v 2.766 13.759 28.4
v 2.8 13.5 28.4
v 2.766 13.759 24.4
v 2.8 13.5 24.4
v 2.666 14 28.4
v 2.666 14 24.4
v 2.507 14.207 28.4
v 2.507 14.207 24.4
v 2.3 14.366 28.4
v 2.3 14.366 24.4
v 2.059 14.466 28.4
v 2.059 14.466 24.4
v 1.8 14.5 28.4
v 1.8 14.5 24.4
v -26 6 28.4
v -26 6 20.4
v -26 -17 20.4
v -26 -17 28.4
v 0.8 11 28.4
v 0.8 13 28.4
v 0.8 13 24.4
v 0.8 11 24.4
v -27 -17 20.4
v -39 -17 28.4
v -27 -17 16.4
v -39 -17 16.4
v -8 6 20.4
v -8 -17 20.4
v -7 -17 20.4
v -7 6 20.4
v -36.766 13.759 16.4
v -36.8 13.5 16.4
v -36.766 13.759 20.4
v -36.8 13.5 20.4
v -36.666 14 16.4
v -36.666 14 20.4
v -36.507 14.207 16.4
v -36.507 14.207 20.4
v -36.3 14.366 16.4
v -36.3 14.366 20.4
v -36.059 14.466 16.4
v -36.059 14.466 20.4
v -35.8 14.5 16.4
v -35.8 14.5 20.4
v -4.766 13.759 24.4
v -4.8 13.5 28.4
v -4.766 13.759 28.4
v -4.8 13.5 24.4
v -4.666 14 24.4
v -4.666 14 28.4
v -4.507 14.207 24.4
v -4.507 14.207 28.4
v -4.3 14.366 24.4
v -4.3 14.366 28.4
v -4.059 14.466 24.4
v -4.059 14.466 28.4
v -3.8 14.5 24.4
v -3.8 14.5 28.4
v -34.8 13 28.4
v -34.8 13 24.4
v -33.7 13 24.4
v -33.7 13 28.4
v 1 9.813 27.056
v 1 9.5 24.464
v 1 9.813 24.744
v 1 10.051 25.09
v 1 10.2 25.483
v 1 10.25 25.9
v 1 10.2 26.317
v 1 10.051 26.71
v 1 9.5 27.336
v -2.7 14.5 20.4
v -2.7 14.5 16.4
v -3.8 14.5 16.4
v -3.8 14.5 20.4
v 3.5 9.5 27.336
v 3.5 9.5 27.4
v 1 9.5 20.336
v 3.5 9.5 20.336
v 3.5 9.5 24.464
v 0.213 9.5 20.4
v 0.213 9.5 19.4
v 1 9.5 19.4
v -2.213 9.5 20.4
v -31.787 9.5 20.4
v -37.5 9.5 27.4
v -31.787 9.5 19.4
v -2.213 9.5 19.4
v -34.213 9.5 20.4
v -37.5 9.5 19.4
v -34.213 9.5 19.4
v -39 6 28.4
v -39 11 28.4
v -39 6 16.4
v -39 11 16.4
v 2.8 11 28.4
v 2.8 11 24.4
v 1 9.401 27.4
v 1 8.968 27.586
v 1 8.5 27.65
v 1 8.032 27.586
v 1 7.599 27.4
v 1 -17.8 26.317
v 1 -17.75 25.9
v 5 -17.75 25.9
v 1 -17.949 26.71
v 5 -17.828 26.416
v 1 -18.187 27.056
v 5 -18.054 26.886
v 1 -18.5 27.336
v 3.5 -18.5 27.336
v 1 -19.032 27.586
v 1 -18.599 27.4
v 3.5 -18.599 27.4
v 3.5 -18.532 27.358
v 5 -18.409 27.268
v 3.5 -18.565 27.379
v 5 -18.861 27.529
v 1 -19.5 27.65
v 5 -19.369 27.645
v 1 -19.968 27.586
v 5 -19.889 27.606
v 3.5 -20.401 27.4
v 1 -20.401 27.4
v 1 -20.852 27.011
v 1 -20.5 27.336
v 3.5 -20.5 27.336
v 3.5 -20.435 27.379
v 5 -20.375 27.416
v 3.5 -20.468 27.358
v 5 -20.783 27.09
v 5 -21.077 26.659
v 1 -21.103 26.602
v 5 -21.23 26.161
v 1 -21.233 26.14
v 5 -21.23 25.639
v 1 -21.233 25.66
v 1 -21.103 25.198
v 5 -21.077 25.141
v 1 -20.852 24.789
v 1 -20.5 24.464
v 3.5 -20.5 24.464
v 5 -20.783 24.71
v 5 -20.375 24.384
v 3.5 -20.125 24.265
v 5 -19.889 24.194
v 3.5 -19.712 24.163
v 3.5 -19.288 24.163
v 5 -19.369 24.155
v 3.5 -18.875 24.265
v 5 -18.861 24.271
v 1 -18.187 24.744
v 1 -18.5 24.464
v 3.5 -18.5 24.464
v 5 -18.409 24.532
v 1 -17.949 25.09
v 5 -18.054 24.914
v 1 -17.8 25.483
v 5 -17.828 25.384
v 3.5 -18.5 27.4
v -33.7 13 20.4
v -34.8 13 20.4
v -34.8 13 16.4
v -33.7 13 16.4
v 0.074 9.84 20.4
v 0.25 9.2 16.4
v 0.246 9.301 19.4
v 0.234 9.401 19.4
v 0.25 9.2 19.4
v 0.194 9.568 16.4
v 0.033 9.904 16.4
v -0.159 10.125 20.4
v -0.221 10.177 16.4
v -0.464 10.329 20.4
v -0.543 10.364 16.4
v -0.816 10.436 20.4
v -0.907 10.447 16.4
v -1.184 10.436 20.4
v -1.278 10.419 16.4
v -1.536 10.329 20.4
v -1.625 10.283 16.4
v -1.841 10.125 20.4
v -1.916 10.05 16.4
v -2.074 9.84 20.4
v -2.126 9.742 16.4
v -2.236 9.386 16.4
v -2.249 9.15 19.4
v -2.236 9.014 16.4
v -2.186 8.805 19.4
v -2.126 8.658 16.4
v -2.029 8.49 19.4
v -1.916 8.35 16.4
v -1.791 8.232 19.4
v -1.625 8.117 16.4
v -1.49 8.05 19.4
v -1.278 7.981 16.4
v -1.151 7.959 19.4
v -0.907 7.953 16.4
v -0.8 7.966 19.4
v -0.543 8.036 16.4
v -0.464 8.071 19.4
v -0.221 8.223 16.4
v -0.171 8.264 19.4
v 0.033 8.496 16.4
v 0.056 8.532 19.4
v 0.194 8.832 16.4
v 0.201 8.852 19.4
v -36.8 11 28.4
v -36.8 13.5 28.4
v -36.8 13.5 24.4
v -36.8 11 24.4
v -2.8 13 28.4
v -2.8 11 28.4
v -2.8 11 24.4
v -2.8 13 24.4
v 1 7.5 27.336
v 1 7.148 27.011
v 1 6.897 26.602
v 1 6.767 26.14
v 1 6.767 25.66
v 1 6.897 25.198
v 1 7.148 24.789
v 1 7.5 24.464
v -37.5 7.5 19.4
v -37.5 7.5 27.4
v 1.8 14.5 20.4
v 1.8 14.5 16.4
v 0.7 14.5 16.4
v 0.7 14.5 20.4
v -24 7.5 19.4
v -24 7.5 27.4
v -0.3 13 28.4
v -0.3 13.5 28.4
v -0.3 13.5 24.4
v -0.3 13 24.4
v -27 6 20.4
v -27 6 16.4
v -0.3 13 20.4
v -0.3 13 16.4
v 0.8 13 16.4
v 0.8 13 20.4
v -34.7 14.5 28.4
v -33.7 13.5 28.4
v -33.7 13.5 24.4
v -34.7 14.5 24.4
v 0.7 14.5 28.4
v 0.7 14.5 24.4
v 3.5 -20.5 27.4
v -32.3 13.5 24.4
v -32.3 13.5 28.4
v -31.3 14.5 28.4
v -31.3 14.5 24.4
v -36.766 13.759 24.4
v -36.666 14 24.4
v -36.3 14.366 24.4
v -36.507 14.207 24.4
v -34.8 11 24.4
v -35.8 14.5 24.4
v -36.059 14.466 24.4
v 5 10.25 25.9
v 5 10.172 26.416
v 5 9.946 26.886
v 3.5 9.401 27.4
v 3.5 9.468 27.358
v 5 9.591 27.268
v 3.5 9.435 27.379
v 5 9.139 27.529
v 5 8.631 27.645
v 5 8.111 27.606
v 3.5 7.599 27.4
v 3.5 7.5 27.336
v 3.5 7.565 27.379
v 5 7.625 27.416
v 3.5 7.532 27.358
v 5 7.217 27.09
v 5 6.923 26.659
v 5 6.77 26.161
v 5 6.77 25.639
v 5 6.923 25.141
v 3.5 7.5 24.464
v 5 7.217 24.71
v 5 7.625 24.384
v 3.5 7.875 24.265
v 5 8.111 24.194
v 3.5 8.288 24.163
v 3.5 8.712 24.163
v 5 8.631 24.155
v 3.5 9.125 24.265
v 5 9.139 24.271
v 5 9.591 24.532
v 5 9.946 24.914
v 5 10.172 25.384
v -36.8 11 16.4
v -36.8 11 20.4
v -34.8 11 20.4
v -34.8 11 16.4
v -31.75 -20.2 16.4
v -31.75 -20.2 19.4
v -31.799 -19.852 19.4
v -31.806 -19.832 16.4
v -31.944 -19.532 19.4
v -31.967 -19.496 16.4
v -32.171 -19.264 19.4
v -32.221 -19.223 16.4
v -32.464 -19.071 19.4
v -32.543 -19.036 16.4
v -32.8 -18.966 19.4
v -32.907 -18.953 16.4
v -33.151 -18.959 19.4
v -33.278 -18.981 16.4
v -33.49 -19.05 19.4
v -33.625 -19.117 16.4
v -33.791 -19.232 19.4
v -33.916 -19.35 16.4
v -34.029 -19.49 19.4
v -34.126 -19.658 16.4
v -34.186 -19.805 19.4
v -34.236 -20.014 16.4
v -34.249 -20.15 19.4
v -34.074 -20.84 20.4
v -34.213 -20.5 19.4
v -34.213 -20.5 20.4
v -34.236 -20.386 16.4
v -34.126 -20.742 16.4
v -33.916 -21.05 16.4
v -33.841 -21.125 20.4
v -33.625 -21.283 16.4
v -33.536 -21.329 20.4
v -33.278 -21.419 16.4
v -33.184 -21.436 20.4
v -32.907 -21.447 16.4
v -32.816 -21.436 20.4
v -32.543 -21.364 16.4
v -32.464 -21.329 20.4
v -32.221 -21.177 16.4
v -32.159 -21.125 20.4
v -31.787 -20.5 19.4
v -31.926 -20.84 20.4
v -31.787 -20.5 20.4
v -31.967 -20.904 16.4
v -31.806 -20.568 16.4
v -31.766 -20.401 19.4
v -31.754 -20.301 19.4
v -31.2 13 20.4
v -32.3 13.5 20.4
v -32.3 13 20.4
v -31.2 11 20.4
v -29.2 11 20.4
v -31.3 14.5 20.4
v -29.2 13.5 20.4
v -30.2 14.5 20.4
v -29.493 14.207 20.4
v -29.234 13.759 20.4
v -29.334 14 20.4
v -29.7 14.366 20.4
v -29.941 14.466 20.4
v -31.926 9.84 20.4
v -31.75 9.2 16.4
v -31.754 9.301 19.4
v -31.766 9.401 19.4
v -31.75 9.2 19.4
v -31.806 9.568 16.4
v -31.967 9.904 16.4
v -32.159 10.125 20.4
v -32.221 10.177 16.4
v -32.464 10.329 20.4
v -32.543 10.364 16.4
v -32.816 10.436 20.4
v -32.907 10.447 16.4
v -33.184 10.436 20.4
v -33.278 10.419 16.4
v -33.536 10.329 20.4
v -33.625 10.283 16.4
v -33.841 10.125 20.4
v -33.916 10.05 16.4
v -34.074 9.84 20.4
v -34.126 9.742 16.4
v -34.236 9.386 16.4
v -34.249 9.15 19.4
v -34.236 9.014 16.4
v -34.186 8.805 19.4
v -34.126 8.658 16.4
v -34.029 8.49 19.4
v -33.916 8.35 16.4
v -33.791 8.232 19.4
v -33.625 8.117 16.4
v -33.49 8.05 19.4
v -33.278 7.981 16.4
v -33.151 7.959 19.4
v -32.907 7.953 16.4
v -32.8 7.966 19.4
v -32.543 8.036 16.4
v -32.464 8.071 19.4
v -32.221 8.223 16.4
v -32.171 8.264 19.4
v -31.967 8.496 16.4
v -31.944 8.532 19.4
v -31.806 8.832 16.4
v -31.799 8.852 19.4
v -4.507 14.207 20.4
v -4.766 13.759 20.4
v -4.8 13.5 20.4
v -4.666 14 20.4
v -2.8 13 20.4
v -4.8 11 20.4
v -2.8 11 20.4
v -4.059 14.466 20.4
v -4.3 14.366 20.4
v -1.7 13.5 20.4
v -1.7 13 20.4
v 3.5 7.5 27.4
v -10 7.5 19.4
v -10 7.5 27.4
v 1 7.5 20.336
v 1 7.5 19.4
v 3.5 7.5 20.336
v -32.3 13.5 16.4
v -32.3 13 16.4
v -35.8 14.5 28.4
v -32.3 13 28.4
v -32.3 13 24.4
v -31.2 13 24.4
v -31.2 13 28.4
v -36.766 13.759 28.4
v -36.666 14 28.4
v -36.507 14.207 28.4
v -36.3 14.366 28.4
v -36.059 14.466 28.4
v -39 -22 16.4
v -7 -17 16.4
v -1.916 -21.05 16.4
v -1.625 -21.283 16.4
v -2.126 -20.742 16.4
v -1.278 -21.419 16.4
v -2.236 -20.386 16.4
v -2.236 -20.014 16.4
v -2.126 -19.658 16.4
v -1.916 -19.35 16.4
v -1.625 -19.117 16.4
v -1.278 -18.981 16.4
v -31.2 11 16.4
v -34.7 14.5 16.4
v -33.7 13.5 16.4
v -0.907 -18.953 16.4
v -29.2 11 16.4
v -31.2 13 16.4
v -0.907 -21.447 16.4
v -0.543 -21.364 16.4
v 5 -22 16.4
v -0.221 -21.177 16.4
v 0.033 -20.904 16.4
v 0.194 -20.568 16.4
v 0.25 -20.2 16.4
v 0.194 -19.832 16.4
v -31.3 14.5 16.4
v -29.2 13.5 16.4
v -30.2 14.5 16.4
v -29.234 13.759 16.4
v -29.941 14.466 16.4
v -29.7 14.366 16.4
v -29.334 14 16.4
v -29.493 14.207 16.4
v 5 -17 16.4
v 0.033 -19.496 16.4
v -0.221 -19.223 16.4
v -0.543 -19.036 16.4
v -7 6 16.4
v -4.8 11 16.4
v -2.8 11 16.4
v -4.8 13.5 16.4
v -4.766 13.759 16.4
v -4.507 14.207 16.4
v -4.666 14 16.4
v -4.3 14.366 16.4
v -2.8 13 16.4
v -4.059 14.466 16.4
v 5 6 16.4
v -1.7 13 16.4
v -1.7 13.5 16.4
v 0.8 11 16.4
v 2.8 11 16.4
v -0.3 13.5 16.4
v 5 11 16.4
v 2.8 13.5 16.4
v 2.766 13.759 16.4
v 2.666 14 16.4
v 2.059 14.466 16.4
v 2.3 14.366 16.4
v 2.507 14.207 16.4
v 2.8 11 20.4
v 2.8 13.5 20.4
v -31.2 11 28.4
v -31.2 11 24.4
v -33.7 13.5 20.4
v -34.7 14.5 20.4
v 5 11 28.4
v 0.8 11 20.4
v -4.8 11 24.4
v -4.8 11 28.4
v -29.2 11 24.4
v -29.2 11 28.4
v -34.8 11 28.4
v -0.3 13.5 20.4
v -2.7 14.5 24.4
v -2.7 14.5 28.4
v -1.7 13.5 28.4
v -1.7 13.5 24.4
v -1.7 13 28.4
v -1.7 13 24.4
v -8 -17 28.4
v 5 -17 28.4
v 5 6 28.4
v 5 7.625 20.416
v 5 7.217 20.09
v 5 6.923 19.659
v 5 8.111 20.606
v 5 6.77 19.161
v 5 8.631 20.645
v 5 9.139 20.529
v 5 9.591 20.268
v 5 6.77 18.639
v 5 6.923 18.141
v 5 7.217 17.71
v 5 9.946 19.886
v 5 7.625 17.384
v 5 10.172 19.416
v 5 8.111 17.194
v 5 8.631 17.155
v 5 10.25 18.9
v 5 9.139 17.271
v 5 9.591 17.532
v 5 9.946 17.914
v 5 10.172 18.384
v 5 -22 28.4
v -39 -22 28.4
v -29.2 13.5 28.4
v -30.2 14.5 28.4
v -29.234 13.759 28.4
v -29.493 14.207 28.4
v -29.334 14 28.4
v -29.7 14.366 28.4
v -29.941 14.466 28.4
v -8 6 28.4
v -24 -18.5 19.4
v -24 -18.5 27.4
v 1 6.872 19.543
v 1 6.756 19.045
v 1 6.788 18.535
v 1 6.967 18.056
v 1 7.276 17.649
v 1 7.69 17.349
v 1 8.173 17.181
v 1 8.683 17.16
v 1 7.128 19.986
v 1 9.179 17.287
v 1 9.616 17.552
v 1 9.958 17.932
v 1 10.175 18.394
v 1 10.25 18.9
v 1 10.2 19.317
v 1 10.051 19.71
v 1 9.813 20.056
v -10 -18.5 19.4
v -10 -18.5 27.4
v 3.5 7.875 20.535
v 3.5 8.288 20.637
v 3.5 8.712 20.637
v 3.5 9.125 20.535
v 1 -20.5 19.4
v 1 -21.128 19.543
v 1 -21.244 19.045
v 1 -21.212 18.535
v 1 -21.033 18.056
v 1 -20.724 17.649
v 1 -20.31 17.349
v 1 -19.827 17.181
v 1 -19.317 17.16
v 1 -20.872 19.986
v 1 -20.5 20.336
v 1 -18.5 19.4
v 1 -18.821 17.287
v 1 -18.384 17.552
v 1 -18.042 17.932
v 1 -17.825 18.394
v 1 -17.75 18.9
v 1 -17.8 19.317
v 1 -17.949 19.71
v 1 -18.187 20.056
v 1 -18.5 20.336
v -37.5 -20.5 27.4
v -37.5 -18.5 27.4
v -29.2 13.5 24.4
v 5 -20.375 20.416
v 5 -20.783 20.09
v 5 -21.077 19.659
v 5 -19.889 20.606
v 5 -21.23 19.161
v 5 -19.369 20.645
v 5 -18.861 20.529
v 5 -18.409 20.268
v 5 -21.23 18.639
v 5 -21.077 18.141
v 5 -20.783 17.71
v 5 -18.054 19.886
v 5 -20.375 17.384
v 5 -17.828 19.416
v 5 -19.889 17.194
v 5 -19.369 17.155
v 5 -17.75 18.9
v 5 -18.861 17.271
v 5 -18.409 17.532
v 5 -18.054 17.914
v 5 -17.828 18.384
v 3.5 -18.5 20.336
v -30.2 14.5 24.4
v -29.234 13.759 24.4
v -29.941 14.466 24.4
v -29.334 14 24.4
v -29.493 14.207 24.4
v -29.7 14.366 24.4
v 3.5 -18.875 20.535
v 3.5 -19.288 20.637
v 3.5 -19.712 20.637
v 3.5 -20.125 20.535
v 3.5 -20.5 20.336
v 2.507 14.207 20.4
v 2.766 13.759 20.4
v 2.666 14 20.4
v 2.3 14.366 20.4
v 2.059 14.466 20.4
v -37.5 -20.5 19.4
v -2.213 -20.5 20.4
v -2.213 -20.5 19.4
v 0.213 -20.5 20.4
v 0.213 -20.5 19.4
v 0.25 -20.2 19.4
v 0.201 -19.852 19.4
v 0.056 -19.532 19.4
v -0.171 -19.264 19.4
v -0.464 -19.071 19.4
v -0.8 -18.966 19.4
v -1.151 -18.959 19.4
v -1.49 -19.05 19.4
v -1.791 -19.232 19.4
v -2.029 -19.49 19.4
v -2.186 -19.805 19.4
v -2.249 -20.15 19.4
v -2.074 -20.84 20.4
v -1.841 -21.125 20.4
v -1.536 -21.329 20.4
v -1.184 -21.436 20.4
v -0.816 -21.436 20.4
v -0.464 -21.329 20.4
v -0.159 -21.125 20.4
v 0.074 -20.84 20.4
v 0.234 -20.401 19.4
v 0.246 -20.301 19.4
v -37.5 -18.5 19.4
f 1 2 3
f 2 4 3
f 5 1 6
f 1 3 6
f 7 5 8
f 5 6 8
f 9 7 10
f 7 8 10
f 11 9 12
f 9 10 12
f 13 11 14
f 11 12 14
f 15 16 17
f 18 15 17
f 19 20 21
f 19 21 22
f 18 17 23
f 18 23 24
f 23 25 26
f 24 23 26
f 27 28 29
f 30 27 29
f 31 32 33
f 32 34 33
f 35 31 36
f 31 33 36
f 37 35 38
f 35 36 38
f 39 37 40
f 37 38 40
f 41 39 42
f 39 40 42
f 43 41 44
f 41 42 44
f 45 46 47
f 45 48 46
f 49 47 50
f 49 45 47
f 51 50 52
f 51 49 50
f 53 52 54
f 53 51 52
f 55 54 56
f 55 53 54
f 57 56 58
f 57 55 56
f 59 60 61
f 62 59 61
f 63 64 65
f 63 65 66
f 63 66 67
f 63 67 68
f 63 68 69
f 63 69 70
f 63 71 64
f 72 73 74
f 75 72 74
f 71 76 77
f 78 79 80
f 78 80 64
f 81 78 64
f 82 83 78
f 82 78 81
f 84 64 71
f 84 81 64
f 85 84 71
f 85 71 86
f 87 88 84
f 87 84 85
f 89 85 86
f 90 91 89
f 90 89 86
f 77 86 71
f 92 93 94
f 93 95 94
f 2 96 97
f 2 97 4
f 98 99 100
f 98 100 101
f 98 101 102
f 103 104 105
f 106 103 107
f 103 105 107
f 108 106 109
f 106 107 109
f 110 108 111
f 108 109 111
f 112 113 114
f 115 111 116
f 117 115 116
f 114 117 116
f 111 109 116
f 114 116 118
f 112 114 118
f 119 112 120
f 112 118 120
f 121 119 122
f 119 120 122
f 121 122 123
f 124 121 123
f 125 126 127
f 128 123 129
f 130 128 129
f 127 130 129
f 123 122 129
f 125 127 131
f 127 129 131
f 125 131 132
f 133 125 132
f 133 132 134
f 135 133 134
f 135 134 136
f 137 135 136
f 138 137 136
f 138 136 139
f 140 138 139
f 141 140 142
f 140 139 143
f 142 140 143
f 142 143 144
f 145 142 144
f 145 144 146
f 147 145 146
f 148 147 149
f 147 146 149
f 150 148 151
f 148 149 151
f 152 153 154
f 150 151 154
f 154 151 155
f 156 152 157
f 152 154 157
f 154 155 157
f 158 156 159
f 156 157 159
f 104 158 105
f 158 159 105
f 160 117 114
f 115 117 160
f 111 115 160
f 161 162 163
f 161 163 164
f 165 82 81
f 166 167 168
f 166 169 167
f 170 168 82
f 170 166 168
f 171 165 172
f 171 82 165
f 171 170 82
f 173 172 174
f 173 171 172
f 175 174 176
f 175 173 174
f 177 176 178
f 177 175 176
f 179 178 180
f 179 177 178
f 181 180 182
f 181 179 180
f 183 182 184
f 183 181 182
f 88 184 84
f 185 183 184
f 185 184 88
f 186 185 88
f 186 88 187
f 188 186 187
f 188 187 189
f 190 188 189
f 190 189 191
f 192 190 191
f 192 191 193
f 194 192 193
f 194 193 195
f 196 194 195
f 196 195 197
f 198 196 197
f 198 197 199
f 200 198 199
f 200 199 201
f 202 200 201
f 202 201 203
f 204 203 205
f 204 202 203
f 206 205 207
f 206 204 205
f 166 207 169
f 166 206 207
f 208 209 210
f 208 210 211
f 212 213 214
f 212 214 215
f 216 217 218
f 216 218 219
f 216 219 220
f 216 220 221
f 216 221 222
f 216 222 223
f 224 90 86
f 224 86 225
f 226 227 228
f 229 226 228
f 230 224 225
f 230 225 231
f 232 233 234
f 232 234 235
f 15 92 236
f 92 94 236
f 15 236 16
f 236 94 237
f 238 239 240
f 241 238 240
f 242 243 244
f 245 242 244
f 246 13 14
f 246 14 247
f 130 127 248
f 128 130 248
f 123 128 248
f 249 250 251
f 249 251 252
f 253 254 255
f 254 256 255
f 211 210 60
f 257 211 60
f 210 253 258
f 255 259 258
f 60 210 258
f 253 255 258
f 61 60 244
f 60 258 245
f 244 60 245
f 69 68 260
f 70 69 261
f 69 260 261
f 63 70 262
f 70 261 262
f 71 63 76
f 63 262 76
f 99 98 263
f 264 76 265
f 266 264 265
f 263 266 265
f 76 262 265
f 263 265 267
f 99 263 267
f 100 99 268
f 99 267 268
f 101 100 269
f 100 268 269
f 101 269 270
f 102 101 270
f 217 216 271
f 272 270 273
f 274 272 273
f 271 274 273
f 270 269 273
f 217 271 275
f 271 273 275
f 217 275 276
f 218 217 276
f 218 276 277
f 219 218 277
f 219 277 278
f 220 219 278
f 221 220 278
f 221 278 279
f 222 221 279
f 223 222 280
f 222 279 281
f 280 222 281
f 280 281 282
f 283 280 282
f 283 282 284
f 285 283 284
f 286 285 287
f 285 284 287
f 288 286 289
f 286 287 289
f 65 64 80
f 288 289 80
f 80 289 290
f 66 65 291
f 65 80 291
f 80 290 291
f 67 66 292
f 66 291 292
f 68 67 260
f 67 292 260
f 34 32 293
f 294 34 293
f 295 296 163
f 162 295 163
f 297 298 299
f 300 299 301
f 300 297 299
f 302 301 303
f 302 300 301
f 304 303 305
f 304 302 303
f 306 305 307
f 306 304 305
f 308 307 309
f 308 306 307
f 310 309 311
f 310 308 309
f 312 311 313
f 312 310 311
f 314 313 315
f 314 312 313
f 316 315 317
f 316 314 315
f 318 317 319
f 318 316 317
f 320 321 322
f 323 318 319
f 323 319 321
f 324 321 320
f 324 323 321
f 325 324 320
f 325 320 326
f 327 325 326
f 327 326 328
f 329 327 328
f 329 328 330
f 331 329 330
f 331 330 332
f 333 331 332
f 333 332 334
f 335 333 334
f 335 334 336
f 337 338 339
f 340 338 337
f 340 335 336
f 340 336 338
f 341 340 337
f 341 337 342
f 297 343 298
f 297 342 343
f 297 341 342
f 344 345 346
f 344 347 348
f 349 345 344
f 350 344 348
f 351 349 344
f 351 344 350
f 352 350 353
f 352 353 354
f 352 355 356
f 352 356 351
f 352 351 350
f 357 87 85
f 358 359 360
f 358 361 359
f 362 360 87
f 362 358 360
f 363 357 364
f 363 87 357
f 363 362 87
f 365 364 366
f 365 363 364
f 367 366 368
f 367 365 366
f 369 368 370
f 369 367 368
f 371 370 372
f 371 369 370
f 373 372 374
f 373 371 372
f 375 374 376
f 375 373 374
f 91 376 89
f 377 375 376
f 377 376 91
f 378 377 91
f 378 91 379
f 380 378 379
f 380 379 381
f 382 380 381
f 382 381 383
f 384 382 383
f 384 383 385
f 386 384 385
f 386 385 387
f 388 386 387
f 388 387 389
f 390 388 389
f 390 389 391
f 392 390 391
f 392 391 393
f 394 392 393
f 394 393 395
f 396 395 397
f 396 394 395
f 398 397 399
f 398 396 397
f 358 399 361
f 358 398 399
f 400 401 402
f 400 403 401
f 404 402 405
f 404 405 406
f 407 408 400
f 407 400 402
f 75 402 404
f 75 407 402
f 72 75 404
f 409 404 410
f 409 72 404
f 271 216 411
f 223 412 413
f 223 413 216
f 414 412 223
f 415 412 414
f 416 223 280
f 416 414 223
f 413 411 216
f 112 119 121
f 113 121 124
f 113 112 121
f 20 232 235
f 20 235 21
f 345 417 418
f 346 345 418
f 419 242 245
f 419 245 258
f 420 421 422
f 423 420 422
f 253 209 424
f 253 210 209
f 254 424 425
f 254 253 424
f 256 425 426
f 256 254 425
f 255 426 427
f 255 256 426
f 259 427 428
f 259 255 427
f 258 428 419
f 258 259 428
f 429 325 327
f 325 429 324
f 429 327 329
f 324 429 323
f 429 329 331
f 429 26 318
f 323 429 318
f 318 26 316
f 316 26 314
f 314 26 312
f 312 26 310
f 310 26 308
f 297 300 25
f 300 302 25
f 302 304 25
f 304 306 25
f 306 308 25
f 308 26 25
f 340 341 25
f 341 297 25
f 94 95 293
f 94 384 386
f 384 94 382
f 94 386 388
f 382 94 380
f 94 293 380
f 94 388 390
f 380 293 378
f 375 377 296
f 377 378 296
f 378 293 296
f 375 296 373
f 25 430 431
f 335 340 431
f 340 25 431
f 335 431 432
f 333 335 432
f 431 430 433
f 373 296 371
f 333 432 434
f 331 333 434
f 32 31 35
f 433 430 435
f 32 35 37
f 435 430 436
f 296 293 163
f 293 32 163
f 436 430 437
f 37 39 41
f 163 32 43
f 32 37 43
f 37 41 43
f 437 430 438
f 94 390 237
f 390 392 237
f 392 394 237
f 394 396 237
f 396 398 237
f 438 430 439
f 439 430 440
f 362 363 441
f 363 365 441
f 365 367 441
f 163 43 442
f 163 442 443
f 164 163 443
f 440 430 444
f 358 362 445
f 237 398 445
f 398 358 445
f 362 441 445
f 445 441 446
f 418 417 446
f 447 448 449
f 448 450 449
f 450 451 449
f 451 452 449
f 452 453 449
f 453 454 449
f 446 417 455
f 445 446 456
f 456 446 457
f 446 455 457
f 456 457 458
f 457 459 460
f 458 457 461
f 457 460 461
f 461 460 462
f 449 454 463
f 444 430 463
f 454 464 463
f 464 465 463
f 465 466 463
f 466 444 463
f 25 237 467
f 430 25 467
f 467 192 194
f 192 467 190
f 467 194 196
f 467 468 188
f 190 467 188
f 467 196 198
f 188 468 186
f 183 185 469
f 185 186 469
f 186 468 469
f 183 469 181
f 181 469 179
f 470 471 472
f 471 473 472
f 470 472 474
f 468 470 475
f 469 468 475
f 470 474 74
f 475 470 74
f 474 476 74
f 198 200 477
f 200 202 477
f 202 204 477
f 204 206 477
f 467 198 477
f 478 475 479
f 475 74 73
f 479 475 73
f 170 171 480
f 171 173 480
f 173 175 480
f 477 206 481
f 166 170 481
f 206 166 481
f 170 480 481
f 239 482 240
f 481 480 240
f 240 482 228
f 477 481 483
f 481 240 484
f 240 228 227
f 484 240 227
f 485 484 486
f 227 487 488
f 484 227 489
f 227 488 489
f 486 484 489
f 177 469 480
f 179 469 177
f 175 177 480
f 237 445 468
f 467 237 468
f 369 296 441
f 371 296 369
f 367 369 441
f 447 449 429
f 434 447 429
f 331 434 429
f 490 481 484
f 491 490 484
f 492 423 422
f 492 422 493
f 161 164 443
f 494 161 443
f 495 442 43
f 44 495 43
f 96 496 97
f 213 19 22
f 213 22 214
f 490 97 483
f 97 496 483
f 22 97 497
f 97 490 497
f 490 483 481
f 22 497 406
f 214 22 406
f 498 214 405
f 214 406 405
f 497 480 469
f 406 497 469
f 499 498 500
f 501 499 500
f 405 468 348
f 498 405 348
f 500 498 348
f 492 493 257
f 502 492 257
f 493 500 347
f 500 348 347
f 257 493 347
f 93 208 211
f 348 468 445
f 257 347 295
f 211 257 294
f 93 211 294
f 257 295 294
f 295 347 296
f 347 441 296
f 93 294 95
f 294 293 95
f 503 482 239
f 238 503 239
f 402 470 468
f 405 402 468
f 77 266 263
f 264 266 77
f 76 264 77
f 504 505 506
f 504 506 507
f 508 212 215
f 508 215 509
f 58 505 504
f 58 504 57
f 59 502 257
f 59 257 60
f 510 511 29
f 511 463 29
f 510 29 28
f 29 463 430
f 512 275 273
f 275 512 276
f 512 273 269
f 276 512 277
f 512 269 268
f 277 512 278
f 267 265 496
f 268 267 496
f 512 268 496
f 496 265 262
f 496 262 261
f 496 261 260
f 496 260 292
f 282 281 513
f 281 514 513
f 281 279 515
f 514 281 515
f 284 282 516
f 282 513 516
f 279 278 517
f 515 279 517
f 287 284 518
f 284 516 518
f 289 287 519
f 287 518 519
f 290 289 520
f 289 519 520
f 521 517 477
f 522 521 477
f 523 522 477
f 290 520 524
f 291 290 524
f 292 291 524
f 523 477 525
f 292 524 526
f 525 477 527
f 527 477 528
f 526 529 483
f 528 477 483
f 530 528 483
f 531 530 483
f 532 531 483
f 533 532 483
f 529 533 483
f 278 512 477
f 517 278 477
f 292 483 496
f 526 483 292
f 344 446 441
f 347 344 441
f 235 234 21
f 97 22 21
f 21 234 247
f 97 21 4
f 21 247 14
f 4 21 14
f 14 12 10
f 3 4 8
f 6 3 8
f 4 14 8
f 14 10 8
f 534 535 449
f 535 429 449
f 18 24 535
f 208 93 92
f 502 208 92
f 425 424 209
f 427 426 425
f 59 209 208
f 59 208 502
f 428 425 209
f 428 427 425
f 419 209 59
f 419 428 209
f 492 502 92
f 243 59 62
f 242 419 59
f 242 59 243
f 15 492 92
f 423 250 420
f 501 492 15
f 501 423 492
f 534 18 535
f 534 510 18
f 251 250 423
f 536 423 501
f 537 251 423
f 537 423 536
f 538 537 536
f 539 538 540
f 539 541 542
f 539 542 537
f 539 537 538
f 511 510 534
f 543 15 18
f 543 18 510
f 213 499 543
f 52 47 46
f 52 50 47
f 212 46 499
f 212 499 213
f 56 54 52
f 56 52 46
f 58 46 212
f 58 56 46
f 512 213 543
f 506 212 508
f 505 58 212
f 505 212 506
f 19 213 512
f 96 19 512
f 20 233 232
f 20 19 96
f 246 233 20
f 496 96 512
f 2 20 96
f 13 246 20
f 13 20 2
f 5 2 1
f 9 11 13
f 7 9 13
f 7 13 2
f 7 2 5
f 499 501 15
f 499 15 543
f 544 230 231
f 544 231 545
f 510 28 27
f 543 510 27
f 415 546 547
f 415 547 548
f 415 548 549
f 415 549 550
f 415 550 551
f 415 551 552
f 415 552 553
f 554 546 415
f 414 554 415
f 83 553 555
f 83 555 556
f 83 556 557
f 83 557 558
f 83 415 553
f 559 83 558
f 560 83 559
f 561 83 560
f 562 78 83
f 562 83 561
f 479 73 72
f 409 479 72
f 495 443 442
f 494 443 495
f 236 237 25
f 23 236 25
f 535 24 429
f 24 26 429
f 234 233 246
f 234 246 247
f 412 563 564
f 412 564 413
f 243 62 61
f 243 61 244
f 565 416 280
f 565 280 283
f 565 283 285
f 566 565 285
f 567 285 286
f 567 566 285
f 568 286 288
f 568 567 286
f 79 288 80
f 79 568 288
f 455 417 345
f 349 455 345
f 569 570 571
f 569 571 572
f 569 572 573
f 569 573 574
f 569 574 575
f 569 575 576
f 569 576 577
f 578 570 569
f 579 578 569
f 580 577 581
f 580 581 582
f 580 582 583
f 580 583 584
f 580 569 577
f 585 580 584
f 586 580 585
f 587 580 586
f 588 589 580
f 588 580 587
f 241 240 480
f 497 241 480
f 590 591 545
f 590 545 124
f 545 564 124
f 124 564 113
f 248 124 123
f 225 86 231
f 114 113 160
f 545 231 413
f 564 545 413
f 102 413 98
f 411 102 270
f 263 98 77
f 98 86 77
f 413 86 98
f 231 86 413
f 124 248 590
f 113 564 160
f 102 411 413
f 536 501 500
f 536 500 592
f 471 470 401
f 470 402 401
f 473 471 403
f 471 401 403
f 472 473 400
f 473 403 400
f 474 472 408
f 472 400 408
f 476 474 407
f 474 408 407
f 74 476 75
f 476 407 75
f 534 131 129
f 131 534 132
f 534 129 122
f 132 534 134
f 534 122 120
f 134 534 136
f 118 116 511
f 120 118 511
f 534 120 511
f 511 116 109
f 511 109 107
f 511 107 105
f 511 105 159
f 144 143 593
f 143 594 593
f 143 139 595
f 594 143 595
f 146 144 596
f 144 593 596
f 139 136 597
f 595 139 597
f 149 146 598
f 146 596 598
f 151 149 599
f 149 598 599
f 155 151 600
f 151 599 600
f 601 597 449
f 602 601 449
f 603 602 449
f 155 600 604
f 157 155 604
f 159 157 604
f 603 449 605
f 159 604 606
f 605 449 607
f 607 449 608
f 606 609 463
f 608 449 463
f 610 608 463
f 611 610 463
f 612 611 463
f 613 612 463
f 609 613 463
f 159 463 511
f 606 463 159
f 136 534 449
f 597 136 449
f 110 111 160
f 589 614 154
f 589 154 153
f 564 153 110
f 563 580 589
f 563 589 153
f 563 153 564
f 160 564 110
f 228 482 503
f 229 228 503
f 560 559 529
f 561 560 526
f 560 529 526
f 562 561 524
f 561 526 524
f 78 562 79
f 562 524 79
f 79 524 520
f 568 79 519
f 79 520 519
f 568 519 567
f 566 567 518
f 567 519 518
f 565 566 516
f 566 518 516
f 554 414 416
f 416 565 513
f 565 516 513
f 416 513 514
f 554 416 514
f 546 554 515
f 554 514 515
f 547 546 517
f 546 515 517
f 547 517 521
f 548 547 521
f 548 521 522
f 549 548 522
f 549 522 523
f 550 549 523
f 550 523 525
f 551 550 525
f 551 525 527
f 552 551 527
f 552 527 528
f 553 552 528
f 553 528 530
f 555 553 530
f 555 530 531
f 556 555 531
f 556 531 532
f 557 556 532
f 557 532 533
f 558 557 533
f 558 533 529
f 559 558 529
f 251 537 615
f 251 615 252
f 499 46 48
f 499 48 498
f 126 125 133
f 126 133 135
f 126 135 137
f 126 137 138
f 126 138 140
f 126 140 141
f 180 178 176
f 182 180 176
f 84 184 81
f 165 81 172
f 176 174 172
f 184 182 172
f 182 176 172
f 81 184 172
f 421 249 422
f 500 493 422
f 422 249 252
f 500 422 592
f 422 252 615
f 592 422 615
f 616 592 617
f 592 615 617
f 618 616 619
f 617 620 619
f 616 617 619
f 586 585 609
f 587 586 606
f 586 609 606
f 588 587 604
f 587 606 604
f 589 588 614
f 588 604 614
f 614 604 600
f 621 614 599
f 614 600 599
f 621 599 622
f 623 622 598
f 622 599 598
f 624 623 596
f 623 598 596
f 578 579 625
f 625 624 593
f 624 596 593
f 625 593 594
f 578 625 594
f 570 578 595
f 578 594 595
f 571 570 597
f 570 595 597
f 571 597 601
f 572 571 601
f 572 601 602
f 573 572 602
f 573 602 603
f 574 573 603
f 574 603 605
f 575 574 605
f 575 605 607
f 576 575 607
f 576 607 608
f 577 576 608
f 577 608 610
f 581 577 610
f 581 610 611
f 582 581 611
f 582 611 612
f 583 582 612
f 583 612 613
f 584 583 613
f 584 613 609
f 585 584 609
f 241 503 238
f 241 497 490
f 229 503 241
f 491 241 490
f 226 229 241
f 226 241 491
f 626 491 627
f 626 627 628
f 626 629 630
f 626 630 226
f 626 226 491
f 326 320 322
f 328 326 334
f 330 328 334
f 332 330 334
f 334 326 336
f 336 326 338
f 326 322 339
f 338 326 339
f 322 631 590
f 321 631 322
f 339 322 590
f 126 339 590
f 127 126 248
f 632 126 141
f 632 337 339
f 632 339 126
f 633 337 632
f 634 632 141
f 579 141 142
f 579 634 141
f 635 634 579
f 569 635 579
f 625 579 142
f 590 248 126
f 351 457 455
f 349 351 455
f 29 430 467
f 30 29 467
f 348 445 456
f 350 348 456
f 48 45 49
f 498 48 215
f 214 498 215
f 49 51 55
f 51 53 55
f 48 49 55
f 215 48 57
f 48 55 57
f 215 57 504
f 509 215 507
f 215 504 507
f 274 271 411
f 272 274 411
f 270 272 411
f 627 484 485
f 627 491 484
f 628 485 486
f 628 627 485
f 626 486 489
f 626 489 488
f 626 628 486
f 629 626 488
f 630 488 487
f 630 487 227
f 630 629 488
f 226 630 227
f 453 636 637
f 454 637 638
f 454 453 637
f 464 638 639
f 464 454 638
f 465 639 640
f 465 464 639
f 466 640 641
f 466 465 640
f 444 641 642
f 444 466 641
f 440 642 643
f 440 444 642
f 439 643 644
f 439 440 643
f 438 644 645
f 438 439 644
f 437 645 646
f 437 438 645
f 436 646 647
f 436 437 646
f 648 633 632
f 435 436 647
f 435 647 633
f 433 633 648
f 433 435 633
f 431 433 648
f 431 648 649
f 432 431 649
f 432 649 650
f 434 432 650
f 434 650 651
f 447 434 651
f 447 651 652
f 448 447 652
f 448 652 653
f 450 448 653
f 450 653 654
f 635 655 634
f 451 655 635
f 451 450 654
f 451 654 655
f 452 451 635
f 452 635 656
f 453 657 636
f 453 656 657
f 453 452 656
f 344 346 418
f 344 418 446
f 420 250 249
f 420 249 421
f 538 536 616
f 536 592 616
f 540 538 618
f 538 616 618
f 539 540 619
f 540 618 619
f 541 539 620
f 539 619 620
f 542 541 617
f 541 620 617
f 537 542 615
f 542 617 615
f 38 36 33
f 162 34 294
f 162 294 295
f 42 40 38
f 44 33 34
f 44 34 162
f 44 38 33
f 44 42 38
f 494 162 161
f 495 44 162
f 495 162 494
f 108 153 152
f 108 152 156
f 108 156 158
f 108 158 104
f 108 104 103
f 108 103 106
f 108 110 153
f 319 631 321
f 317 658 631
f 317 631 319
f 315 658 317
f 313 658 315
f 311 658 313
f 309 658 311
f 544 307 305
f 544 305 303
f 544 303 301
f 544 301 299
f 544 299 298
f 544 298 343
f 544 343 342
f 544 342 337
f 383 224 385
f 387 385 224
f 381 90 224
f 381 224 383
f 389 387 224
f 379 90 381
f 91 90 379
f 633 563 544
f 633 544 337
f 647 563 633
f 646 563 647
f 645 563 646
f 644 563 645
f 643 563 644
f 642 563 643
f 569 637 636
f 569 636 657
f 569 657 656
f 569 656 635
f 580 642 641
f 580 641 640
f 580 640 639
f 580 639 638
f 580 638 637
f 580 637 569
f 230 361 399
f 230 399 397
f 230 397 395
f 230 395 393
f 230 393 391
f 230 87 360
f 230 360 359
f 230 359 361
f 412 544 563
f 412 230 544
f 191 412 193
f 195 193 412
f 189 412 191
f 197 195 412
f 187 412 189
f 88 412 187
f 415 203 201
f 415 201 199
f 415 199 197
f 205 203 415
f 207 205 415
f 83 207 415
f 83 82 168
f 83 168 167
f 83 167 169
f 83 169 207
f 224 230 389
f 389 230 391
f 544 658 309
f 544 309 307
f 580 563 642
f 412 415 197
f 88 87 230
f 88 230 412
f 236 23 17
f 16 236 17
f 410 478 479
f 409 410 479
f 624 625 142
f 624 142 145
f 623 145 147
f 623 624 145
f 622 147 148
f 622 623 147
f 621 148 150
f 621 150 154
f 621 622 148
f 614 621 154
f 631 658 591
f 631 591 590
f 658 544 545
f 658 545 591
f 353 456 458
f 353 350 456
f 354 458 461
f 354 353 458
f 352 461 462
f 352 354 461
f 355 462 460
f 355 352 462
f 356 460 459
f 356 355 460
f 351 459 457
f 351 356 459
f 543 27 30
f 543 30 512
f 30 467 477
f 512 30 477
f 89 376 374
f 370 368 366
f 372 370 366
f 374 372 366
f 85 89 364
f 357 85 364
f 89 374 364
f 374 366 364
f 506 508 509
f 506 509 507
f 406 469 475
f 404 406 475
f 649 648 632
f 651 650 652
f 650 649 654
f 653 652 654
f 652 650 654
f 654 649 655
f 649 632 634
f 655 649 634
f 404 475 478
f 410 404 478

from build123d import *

# Parameters (mm, degrees)
SKETCH068_R     = 1.25
PAD036_DEPTH    = 4
PAD037_DEPTH    = 8
POCKET027_DEPTH = 8
PAD038_DEPTH    = 4
PAD039_DEPTH    = 4
PAD040_DEPTH    = 4
PAD041_DEPTH    = 4
SKETCH076_R     = 1.75
POCKET028_DEPTH = 4
FILLET006_R     = 1
CHAMFER_SIZE    = 1


with BuildPart() as part:
    # Sketch068 → Pad036 (new body)
    with BuildSketch(Plane.XY):
        Polygon((0, 0), (-44, 0), (-44, -5), (-32, -5), (-32, -28), (-44, -28), (-44, -33), (0, -33), (0, -28), (-12, -28), (-12, -5), (0, -5), align=None)
        with Locations((-6, -1.8)):
            Circle(SKETCH068_R, mode=Mode.SUBTRACT)
        with Locations((-38, -31.2)):
            Circle(SKETCH068_R, mode=Mode.SUBTRACT)
        with Locations((-6, -31.2)):
            Circle(SKETCH068_R, mode=Mode.SUBTRACT)
        with Locations((-38, -1.8)):
            Circle(SKETCH068_R, mode=Mode.SUBTRACT)
    extrude(amount=PAD036_DEPTH)

    # Sketch069 → Pad037 (join)
    with BuildSketch(Plane.XY.offset(4)):
        Polygon((0, 0), (-44, 0), (-44, -5), (-31, -5), (-31, -28), (-44, -28), (-44, -33), (0, -33), (0, -28), (-13, -28), (-13, -5), (0, -5), align=None)
    extrude(amount=PAD037_DEPTH)

    # Sketch070 → Pocket027 (cut)
    with BuildSketch(Plane.XY.offset(3)):
        Polygon((-42.5, -1.5), (-42.5, -3.5), (-29, -3.5), (-29, -5), (-29, -29.5), (-42.5, -29.5), (-42.5, -31.5), (-1.5, -31.5), (-1.5, -29.5), (-15, -29.5), (-15, -3.5), (-1.5, -3.5), (-1.5, -1.5), align=None)
    extrude(amount=POCKET027_DEPTH, mode=Mode.SUBTRACT)

    # Sketch072 → Pad038 (join)
    with BuildSketch(Plane(origin=(-38, 0, 12), x_dir=(1, 0, 0), z_dir=(0, 0, 1))):
        Polygon((-1.8, 0), (-1.8, 2), (-0.7, 2), (-0.7, 3.5), (-3.8, 3.5), (-3.8, 0), align=None)
        Polygon((0.7, 2), (1.8, 2), (1.8, 0), (3.8, 0), (3.8, 3.5), (0.7, 3.5), align=None)
    extrude(amount=-PAD038_DEPTH)

    # Sketch073 → Pad039 (join)
    with BuildSketch(Plane(origin=(-38, 0, 0), x_dir=(1, 0, 0), z_dir=(0, 0, 1))):
        Polygon((-1.8, 0), (-1.8, 2), (-0.7, 2), (-0.7, 3.5), (-3.8, 3.5), (-3.8, 0), align=None)
        Polygon((0.7, 2), (1.8, 2), (1.8, 0), (3.8, 0), (3.8, 3.5), (0.7, 3.5), align=None)
    extrude(amount=PAD039_DEPTH)

    # Sketch074 → Pad040 (join)
    with BuildSketch(Plane(origin=(-6, 0, 0), x_dir=(1, 0, 0), z_dir=(0, 0, 1))):
        Polygon((-1.8, 0), (-1.8, 2), (-0.7, 2), (-0.7, 3.5), (-3.8, 3.5), (-3.8, 0), align=None)
        Polygon((0.7, 2), (1.8, 2), (1.8, 0), (3.8, 0), (3.8, 3.5), (0.7, 3.5), align=None)
    extrude(amount=PAD040_DEPTH)

    # Sketch075 → Pad041 (join)
    with BuildSketch(Plane(origin=(-6, 0, 12), x_dir=(1, 0, 0), z_dir=(0, 0, 1))):
        Polygon((-1.8, 0), (-1.8, 2), (-0.7, 2), (-0.7, 3.5), (-3.8, 3.5), (-3.8, 0), align=None)
        Polygon((0.7, 2), (1.8, 2), (1.8, 0), (3.8, 0), (3.8, 3.5), (0.7, 3.5), align=None)
    extrude(amount=-PAD041_DEPTH)

    # Sketch076 → Pocket028 (cut)
    with BuildSketch(Plane.YZ):
        with Locations((-30.5, 9.5)):
            Circle(SKETCH076_R)
        with Locations((-30.5, 2.5)):
            Circle(SKETCH076_R)
        with Locations((-2.5, 2.5)):
            Circle(SKETCH076_R)
        with Locations((-2.5, 9.5)):
            Circle(SKETCH076_R)
    extrude(amount=-POCKET028_DEPTH, mode=Mode.SUBTRACT)

    # Fillet006
    fillet006_edges = [part.edges().sort_by_distance(p)[0] for p in [
        (-9.8, 3.5, 2),
        (-2.2, 3.5, 2),
        (-2.2, 3.5, 10),
        (-9.8, 3.5, 10),
        (-34.2, 3.5, 10),
        (-41.8, 3.5, 10),
        (-41.8, 3.5, 2),
        (-34.2, 3.5, 2),
    ]]
    fillet(fillet006_edges, radius=FILLET006_R)

    # Chamfer
    chamfer_edges = [part.edges().sort_by_distance(p)[0] for p in [
        (-5.3, 3.5, 2),
        (-6.7, 3.5, 2),
        (-5.3, 3.5, 10),
        (-6.7, 3.5, 10),
        (-37.3, 3.5, 2),
        (-38.7, 3.5, 2),
        (-38.7, 3.5, 10),
        (-37.3, 3.5, 10),
    ]]
    chamfer(chamfer_edges, length=CHAMFER_SIZE)


with BuildPart() as part_1:
    # Body011 placement: moved
    add(part.part.moved(Location((5, 11, 16.4))))


solid = part_1.part
